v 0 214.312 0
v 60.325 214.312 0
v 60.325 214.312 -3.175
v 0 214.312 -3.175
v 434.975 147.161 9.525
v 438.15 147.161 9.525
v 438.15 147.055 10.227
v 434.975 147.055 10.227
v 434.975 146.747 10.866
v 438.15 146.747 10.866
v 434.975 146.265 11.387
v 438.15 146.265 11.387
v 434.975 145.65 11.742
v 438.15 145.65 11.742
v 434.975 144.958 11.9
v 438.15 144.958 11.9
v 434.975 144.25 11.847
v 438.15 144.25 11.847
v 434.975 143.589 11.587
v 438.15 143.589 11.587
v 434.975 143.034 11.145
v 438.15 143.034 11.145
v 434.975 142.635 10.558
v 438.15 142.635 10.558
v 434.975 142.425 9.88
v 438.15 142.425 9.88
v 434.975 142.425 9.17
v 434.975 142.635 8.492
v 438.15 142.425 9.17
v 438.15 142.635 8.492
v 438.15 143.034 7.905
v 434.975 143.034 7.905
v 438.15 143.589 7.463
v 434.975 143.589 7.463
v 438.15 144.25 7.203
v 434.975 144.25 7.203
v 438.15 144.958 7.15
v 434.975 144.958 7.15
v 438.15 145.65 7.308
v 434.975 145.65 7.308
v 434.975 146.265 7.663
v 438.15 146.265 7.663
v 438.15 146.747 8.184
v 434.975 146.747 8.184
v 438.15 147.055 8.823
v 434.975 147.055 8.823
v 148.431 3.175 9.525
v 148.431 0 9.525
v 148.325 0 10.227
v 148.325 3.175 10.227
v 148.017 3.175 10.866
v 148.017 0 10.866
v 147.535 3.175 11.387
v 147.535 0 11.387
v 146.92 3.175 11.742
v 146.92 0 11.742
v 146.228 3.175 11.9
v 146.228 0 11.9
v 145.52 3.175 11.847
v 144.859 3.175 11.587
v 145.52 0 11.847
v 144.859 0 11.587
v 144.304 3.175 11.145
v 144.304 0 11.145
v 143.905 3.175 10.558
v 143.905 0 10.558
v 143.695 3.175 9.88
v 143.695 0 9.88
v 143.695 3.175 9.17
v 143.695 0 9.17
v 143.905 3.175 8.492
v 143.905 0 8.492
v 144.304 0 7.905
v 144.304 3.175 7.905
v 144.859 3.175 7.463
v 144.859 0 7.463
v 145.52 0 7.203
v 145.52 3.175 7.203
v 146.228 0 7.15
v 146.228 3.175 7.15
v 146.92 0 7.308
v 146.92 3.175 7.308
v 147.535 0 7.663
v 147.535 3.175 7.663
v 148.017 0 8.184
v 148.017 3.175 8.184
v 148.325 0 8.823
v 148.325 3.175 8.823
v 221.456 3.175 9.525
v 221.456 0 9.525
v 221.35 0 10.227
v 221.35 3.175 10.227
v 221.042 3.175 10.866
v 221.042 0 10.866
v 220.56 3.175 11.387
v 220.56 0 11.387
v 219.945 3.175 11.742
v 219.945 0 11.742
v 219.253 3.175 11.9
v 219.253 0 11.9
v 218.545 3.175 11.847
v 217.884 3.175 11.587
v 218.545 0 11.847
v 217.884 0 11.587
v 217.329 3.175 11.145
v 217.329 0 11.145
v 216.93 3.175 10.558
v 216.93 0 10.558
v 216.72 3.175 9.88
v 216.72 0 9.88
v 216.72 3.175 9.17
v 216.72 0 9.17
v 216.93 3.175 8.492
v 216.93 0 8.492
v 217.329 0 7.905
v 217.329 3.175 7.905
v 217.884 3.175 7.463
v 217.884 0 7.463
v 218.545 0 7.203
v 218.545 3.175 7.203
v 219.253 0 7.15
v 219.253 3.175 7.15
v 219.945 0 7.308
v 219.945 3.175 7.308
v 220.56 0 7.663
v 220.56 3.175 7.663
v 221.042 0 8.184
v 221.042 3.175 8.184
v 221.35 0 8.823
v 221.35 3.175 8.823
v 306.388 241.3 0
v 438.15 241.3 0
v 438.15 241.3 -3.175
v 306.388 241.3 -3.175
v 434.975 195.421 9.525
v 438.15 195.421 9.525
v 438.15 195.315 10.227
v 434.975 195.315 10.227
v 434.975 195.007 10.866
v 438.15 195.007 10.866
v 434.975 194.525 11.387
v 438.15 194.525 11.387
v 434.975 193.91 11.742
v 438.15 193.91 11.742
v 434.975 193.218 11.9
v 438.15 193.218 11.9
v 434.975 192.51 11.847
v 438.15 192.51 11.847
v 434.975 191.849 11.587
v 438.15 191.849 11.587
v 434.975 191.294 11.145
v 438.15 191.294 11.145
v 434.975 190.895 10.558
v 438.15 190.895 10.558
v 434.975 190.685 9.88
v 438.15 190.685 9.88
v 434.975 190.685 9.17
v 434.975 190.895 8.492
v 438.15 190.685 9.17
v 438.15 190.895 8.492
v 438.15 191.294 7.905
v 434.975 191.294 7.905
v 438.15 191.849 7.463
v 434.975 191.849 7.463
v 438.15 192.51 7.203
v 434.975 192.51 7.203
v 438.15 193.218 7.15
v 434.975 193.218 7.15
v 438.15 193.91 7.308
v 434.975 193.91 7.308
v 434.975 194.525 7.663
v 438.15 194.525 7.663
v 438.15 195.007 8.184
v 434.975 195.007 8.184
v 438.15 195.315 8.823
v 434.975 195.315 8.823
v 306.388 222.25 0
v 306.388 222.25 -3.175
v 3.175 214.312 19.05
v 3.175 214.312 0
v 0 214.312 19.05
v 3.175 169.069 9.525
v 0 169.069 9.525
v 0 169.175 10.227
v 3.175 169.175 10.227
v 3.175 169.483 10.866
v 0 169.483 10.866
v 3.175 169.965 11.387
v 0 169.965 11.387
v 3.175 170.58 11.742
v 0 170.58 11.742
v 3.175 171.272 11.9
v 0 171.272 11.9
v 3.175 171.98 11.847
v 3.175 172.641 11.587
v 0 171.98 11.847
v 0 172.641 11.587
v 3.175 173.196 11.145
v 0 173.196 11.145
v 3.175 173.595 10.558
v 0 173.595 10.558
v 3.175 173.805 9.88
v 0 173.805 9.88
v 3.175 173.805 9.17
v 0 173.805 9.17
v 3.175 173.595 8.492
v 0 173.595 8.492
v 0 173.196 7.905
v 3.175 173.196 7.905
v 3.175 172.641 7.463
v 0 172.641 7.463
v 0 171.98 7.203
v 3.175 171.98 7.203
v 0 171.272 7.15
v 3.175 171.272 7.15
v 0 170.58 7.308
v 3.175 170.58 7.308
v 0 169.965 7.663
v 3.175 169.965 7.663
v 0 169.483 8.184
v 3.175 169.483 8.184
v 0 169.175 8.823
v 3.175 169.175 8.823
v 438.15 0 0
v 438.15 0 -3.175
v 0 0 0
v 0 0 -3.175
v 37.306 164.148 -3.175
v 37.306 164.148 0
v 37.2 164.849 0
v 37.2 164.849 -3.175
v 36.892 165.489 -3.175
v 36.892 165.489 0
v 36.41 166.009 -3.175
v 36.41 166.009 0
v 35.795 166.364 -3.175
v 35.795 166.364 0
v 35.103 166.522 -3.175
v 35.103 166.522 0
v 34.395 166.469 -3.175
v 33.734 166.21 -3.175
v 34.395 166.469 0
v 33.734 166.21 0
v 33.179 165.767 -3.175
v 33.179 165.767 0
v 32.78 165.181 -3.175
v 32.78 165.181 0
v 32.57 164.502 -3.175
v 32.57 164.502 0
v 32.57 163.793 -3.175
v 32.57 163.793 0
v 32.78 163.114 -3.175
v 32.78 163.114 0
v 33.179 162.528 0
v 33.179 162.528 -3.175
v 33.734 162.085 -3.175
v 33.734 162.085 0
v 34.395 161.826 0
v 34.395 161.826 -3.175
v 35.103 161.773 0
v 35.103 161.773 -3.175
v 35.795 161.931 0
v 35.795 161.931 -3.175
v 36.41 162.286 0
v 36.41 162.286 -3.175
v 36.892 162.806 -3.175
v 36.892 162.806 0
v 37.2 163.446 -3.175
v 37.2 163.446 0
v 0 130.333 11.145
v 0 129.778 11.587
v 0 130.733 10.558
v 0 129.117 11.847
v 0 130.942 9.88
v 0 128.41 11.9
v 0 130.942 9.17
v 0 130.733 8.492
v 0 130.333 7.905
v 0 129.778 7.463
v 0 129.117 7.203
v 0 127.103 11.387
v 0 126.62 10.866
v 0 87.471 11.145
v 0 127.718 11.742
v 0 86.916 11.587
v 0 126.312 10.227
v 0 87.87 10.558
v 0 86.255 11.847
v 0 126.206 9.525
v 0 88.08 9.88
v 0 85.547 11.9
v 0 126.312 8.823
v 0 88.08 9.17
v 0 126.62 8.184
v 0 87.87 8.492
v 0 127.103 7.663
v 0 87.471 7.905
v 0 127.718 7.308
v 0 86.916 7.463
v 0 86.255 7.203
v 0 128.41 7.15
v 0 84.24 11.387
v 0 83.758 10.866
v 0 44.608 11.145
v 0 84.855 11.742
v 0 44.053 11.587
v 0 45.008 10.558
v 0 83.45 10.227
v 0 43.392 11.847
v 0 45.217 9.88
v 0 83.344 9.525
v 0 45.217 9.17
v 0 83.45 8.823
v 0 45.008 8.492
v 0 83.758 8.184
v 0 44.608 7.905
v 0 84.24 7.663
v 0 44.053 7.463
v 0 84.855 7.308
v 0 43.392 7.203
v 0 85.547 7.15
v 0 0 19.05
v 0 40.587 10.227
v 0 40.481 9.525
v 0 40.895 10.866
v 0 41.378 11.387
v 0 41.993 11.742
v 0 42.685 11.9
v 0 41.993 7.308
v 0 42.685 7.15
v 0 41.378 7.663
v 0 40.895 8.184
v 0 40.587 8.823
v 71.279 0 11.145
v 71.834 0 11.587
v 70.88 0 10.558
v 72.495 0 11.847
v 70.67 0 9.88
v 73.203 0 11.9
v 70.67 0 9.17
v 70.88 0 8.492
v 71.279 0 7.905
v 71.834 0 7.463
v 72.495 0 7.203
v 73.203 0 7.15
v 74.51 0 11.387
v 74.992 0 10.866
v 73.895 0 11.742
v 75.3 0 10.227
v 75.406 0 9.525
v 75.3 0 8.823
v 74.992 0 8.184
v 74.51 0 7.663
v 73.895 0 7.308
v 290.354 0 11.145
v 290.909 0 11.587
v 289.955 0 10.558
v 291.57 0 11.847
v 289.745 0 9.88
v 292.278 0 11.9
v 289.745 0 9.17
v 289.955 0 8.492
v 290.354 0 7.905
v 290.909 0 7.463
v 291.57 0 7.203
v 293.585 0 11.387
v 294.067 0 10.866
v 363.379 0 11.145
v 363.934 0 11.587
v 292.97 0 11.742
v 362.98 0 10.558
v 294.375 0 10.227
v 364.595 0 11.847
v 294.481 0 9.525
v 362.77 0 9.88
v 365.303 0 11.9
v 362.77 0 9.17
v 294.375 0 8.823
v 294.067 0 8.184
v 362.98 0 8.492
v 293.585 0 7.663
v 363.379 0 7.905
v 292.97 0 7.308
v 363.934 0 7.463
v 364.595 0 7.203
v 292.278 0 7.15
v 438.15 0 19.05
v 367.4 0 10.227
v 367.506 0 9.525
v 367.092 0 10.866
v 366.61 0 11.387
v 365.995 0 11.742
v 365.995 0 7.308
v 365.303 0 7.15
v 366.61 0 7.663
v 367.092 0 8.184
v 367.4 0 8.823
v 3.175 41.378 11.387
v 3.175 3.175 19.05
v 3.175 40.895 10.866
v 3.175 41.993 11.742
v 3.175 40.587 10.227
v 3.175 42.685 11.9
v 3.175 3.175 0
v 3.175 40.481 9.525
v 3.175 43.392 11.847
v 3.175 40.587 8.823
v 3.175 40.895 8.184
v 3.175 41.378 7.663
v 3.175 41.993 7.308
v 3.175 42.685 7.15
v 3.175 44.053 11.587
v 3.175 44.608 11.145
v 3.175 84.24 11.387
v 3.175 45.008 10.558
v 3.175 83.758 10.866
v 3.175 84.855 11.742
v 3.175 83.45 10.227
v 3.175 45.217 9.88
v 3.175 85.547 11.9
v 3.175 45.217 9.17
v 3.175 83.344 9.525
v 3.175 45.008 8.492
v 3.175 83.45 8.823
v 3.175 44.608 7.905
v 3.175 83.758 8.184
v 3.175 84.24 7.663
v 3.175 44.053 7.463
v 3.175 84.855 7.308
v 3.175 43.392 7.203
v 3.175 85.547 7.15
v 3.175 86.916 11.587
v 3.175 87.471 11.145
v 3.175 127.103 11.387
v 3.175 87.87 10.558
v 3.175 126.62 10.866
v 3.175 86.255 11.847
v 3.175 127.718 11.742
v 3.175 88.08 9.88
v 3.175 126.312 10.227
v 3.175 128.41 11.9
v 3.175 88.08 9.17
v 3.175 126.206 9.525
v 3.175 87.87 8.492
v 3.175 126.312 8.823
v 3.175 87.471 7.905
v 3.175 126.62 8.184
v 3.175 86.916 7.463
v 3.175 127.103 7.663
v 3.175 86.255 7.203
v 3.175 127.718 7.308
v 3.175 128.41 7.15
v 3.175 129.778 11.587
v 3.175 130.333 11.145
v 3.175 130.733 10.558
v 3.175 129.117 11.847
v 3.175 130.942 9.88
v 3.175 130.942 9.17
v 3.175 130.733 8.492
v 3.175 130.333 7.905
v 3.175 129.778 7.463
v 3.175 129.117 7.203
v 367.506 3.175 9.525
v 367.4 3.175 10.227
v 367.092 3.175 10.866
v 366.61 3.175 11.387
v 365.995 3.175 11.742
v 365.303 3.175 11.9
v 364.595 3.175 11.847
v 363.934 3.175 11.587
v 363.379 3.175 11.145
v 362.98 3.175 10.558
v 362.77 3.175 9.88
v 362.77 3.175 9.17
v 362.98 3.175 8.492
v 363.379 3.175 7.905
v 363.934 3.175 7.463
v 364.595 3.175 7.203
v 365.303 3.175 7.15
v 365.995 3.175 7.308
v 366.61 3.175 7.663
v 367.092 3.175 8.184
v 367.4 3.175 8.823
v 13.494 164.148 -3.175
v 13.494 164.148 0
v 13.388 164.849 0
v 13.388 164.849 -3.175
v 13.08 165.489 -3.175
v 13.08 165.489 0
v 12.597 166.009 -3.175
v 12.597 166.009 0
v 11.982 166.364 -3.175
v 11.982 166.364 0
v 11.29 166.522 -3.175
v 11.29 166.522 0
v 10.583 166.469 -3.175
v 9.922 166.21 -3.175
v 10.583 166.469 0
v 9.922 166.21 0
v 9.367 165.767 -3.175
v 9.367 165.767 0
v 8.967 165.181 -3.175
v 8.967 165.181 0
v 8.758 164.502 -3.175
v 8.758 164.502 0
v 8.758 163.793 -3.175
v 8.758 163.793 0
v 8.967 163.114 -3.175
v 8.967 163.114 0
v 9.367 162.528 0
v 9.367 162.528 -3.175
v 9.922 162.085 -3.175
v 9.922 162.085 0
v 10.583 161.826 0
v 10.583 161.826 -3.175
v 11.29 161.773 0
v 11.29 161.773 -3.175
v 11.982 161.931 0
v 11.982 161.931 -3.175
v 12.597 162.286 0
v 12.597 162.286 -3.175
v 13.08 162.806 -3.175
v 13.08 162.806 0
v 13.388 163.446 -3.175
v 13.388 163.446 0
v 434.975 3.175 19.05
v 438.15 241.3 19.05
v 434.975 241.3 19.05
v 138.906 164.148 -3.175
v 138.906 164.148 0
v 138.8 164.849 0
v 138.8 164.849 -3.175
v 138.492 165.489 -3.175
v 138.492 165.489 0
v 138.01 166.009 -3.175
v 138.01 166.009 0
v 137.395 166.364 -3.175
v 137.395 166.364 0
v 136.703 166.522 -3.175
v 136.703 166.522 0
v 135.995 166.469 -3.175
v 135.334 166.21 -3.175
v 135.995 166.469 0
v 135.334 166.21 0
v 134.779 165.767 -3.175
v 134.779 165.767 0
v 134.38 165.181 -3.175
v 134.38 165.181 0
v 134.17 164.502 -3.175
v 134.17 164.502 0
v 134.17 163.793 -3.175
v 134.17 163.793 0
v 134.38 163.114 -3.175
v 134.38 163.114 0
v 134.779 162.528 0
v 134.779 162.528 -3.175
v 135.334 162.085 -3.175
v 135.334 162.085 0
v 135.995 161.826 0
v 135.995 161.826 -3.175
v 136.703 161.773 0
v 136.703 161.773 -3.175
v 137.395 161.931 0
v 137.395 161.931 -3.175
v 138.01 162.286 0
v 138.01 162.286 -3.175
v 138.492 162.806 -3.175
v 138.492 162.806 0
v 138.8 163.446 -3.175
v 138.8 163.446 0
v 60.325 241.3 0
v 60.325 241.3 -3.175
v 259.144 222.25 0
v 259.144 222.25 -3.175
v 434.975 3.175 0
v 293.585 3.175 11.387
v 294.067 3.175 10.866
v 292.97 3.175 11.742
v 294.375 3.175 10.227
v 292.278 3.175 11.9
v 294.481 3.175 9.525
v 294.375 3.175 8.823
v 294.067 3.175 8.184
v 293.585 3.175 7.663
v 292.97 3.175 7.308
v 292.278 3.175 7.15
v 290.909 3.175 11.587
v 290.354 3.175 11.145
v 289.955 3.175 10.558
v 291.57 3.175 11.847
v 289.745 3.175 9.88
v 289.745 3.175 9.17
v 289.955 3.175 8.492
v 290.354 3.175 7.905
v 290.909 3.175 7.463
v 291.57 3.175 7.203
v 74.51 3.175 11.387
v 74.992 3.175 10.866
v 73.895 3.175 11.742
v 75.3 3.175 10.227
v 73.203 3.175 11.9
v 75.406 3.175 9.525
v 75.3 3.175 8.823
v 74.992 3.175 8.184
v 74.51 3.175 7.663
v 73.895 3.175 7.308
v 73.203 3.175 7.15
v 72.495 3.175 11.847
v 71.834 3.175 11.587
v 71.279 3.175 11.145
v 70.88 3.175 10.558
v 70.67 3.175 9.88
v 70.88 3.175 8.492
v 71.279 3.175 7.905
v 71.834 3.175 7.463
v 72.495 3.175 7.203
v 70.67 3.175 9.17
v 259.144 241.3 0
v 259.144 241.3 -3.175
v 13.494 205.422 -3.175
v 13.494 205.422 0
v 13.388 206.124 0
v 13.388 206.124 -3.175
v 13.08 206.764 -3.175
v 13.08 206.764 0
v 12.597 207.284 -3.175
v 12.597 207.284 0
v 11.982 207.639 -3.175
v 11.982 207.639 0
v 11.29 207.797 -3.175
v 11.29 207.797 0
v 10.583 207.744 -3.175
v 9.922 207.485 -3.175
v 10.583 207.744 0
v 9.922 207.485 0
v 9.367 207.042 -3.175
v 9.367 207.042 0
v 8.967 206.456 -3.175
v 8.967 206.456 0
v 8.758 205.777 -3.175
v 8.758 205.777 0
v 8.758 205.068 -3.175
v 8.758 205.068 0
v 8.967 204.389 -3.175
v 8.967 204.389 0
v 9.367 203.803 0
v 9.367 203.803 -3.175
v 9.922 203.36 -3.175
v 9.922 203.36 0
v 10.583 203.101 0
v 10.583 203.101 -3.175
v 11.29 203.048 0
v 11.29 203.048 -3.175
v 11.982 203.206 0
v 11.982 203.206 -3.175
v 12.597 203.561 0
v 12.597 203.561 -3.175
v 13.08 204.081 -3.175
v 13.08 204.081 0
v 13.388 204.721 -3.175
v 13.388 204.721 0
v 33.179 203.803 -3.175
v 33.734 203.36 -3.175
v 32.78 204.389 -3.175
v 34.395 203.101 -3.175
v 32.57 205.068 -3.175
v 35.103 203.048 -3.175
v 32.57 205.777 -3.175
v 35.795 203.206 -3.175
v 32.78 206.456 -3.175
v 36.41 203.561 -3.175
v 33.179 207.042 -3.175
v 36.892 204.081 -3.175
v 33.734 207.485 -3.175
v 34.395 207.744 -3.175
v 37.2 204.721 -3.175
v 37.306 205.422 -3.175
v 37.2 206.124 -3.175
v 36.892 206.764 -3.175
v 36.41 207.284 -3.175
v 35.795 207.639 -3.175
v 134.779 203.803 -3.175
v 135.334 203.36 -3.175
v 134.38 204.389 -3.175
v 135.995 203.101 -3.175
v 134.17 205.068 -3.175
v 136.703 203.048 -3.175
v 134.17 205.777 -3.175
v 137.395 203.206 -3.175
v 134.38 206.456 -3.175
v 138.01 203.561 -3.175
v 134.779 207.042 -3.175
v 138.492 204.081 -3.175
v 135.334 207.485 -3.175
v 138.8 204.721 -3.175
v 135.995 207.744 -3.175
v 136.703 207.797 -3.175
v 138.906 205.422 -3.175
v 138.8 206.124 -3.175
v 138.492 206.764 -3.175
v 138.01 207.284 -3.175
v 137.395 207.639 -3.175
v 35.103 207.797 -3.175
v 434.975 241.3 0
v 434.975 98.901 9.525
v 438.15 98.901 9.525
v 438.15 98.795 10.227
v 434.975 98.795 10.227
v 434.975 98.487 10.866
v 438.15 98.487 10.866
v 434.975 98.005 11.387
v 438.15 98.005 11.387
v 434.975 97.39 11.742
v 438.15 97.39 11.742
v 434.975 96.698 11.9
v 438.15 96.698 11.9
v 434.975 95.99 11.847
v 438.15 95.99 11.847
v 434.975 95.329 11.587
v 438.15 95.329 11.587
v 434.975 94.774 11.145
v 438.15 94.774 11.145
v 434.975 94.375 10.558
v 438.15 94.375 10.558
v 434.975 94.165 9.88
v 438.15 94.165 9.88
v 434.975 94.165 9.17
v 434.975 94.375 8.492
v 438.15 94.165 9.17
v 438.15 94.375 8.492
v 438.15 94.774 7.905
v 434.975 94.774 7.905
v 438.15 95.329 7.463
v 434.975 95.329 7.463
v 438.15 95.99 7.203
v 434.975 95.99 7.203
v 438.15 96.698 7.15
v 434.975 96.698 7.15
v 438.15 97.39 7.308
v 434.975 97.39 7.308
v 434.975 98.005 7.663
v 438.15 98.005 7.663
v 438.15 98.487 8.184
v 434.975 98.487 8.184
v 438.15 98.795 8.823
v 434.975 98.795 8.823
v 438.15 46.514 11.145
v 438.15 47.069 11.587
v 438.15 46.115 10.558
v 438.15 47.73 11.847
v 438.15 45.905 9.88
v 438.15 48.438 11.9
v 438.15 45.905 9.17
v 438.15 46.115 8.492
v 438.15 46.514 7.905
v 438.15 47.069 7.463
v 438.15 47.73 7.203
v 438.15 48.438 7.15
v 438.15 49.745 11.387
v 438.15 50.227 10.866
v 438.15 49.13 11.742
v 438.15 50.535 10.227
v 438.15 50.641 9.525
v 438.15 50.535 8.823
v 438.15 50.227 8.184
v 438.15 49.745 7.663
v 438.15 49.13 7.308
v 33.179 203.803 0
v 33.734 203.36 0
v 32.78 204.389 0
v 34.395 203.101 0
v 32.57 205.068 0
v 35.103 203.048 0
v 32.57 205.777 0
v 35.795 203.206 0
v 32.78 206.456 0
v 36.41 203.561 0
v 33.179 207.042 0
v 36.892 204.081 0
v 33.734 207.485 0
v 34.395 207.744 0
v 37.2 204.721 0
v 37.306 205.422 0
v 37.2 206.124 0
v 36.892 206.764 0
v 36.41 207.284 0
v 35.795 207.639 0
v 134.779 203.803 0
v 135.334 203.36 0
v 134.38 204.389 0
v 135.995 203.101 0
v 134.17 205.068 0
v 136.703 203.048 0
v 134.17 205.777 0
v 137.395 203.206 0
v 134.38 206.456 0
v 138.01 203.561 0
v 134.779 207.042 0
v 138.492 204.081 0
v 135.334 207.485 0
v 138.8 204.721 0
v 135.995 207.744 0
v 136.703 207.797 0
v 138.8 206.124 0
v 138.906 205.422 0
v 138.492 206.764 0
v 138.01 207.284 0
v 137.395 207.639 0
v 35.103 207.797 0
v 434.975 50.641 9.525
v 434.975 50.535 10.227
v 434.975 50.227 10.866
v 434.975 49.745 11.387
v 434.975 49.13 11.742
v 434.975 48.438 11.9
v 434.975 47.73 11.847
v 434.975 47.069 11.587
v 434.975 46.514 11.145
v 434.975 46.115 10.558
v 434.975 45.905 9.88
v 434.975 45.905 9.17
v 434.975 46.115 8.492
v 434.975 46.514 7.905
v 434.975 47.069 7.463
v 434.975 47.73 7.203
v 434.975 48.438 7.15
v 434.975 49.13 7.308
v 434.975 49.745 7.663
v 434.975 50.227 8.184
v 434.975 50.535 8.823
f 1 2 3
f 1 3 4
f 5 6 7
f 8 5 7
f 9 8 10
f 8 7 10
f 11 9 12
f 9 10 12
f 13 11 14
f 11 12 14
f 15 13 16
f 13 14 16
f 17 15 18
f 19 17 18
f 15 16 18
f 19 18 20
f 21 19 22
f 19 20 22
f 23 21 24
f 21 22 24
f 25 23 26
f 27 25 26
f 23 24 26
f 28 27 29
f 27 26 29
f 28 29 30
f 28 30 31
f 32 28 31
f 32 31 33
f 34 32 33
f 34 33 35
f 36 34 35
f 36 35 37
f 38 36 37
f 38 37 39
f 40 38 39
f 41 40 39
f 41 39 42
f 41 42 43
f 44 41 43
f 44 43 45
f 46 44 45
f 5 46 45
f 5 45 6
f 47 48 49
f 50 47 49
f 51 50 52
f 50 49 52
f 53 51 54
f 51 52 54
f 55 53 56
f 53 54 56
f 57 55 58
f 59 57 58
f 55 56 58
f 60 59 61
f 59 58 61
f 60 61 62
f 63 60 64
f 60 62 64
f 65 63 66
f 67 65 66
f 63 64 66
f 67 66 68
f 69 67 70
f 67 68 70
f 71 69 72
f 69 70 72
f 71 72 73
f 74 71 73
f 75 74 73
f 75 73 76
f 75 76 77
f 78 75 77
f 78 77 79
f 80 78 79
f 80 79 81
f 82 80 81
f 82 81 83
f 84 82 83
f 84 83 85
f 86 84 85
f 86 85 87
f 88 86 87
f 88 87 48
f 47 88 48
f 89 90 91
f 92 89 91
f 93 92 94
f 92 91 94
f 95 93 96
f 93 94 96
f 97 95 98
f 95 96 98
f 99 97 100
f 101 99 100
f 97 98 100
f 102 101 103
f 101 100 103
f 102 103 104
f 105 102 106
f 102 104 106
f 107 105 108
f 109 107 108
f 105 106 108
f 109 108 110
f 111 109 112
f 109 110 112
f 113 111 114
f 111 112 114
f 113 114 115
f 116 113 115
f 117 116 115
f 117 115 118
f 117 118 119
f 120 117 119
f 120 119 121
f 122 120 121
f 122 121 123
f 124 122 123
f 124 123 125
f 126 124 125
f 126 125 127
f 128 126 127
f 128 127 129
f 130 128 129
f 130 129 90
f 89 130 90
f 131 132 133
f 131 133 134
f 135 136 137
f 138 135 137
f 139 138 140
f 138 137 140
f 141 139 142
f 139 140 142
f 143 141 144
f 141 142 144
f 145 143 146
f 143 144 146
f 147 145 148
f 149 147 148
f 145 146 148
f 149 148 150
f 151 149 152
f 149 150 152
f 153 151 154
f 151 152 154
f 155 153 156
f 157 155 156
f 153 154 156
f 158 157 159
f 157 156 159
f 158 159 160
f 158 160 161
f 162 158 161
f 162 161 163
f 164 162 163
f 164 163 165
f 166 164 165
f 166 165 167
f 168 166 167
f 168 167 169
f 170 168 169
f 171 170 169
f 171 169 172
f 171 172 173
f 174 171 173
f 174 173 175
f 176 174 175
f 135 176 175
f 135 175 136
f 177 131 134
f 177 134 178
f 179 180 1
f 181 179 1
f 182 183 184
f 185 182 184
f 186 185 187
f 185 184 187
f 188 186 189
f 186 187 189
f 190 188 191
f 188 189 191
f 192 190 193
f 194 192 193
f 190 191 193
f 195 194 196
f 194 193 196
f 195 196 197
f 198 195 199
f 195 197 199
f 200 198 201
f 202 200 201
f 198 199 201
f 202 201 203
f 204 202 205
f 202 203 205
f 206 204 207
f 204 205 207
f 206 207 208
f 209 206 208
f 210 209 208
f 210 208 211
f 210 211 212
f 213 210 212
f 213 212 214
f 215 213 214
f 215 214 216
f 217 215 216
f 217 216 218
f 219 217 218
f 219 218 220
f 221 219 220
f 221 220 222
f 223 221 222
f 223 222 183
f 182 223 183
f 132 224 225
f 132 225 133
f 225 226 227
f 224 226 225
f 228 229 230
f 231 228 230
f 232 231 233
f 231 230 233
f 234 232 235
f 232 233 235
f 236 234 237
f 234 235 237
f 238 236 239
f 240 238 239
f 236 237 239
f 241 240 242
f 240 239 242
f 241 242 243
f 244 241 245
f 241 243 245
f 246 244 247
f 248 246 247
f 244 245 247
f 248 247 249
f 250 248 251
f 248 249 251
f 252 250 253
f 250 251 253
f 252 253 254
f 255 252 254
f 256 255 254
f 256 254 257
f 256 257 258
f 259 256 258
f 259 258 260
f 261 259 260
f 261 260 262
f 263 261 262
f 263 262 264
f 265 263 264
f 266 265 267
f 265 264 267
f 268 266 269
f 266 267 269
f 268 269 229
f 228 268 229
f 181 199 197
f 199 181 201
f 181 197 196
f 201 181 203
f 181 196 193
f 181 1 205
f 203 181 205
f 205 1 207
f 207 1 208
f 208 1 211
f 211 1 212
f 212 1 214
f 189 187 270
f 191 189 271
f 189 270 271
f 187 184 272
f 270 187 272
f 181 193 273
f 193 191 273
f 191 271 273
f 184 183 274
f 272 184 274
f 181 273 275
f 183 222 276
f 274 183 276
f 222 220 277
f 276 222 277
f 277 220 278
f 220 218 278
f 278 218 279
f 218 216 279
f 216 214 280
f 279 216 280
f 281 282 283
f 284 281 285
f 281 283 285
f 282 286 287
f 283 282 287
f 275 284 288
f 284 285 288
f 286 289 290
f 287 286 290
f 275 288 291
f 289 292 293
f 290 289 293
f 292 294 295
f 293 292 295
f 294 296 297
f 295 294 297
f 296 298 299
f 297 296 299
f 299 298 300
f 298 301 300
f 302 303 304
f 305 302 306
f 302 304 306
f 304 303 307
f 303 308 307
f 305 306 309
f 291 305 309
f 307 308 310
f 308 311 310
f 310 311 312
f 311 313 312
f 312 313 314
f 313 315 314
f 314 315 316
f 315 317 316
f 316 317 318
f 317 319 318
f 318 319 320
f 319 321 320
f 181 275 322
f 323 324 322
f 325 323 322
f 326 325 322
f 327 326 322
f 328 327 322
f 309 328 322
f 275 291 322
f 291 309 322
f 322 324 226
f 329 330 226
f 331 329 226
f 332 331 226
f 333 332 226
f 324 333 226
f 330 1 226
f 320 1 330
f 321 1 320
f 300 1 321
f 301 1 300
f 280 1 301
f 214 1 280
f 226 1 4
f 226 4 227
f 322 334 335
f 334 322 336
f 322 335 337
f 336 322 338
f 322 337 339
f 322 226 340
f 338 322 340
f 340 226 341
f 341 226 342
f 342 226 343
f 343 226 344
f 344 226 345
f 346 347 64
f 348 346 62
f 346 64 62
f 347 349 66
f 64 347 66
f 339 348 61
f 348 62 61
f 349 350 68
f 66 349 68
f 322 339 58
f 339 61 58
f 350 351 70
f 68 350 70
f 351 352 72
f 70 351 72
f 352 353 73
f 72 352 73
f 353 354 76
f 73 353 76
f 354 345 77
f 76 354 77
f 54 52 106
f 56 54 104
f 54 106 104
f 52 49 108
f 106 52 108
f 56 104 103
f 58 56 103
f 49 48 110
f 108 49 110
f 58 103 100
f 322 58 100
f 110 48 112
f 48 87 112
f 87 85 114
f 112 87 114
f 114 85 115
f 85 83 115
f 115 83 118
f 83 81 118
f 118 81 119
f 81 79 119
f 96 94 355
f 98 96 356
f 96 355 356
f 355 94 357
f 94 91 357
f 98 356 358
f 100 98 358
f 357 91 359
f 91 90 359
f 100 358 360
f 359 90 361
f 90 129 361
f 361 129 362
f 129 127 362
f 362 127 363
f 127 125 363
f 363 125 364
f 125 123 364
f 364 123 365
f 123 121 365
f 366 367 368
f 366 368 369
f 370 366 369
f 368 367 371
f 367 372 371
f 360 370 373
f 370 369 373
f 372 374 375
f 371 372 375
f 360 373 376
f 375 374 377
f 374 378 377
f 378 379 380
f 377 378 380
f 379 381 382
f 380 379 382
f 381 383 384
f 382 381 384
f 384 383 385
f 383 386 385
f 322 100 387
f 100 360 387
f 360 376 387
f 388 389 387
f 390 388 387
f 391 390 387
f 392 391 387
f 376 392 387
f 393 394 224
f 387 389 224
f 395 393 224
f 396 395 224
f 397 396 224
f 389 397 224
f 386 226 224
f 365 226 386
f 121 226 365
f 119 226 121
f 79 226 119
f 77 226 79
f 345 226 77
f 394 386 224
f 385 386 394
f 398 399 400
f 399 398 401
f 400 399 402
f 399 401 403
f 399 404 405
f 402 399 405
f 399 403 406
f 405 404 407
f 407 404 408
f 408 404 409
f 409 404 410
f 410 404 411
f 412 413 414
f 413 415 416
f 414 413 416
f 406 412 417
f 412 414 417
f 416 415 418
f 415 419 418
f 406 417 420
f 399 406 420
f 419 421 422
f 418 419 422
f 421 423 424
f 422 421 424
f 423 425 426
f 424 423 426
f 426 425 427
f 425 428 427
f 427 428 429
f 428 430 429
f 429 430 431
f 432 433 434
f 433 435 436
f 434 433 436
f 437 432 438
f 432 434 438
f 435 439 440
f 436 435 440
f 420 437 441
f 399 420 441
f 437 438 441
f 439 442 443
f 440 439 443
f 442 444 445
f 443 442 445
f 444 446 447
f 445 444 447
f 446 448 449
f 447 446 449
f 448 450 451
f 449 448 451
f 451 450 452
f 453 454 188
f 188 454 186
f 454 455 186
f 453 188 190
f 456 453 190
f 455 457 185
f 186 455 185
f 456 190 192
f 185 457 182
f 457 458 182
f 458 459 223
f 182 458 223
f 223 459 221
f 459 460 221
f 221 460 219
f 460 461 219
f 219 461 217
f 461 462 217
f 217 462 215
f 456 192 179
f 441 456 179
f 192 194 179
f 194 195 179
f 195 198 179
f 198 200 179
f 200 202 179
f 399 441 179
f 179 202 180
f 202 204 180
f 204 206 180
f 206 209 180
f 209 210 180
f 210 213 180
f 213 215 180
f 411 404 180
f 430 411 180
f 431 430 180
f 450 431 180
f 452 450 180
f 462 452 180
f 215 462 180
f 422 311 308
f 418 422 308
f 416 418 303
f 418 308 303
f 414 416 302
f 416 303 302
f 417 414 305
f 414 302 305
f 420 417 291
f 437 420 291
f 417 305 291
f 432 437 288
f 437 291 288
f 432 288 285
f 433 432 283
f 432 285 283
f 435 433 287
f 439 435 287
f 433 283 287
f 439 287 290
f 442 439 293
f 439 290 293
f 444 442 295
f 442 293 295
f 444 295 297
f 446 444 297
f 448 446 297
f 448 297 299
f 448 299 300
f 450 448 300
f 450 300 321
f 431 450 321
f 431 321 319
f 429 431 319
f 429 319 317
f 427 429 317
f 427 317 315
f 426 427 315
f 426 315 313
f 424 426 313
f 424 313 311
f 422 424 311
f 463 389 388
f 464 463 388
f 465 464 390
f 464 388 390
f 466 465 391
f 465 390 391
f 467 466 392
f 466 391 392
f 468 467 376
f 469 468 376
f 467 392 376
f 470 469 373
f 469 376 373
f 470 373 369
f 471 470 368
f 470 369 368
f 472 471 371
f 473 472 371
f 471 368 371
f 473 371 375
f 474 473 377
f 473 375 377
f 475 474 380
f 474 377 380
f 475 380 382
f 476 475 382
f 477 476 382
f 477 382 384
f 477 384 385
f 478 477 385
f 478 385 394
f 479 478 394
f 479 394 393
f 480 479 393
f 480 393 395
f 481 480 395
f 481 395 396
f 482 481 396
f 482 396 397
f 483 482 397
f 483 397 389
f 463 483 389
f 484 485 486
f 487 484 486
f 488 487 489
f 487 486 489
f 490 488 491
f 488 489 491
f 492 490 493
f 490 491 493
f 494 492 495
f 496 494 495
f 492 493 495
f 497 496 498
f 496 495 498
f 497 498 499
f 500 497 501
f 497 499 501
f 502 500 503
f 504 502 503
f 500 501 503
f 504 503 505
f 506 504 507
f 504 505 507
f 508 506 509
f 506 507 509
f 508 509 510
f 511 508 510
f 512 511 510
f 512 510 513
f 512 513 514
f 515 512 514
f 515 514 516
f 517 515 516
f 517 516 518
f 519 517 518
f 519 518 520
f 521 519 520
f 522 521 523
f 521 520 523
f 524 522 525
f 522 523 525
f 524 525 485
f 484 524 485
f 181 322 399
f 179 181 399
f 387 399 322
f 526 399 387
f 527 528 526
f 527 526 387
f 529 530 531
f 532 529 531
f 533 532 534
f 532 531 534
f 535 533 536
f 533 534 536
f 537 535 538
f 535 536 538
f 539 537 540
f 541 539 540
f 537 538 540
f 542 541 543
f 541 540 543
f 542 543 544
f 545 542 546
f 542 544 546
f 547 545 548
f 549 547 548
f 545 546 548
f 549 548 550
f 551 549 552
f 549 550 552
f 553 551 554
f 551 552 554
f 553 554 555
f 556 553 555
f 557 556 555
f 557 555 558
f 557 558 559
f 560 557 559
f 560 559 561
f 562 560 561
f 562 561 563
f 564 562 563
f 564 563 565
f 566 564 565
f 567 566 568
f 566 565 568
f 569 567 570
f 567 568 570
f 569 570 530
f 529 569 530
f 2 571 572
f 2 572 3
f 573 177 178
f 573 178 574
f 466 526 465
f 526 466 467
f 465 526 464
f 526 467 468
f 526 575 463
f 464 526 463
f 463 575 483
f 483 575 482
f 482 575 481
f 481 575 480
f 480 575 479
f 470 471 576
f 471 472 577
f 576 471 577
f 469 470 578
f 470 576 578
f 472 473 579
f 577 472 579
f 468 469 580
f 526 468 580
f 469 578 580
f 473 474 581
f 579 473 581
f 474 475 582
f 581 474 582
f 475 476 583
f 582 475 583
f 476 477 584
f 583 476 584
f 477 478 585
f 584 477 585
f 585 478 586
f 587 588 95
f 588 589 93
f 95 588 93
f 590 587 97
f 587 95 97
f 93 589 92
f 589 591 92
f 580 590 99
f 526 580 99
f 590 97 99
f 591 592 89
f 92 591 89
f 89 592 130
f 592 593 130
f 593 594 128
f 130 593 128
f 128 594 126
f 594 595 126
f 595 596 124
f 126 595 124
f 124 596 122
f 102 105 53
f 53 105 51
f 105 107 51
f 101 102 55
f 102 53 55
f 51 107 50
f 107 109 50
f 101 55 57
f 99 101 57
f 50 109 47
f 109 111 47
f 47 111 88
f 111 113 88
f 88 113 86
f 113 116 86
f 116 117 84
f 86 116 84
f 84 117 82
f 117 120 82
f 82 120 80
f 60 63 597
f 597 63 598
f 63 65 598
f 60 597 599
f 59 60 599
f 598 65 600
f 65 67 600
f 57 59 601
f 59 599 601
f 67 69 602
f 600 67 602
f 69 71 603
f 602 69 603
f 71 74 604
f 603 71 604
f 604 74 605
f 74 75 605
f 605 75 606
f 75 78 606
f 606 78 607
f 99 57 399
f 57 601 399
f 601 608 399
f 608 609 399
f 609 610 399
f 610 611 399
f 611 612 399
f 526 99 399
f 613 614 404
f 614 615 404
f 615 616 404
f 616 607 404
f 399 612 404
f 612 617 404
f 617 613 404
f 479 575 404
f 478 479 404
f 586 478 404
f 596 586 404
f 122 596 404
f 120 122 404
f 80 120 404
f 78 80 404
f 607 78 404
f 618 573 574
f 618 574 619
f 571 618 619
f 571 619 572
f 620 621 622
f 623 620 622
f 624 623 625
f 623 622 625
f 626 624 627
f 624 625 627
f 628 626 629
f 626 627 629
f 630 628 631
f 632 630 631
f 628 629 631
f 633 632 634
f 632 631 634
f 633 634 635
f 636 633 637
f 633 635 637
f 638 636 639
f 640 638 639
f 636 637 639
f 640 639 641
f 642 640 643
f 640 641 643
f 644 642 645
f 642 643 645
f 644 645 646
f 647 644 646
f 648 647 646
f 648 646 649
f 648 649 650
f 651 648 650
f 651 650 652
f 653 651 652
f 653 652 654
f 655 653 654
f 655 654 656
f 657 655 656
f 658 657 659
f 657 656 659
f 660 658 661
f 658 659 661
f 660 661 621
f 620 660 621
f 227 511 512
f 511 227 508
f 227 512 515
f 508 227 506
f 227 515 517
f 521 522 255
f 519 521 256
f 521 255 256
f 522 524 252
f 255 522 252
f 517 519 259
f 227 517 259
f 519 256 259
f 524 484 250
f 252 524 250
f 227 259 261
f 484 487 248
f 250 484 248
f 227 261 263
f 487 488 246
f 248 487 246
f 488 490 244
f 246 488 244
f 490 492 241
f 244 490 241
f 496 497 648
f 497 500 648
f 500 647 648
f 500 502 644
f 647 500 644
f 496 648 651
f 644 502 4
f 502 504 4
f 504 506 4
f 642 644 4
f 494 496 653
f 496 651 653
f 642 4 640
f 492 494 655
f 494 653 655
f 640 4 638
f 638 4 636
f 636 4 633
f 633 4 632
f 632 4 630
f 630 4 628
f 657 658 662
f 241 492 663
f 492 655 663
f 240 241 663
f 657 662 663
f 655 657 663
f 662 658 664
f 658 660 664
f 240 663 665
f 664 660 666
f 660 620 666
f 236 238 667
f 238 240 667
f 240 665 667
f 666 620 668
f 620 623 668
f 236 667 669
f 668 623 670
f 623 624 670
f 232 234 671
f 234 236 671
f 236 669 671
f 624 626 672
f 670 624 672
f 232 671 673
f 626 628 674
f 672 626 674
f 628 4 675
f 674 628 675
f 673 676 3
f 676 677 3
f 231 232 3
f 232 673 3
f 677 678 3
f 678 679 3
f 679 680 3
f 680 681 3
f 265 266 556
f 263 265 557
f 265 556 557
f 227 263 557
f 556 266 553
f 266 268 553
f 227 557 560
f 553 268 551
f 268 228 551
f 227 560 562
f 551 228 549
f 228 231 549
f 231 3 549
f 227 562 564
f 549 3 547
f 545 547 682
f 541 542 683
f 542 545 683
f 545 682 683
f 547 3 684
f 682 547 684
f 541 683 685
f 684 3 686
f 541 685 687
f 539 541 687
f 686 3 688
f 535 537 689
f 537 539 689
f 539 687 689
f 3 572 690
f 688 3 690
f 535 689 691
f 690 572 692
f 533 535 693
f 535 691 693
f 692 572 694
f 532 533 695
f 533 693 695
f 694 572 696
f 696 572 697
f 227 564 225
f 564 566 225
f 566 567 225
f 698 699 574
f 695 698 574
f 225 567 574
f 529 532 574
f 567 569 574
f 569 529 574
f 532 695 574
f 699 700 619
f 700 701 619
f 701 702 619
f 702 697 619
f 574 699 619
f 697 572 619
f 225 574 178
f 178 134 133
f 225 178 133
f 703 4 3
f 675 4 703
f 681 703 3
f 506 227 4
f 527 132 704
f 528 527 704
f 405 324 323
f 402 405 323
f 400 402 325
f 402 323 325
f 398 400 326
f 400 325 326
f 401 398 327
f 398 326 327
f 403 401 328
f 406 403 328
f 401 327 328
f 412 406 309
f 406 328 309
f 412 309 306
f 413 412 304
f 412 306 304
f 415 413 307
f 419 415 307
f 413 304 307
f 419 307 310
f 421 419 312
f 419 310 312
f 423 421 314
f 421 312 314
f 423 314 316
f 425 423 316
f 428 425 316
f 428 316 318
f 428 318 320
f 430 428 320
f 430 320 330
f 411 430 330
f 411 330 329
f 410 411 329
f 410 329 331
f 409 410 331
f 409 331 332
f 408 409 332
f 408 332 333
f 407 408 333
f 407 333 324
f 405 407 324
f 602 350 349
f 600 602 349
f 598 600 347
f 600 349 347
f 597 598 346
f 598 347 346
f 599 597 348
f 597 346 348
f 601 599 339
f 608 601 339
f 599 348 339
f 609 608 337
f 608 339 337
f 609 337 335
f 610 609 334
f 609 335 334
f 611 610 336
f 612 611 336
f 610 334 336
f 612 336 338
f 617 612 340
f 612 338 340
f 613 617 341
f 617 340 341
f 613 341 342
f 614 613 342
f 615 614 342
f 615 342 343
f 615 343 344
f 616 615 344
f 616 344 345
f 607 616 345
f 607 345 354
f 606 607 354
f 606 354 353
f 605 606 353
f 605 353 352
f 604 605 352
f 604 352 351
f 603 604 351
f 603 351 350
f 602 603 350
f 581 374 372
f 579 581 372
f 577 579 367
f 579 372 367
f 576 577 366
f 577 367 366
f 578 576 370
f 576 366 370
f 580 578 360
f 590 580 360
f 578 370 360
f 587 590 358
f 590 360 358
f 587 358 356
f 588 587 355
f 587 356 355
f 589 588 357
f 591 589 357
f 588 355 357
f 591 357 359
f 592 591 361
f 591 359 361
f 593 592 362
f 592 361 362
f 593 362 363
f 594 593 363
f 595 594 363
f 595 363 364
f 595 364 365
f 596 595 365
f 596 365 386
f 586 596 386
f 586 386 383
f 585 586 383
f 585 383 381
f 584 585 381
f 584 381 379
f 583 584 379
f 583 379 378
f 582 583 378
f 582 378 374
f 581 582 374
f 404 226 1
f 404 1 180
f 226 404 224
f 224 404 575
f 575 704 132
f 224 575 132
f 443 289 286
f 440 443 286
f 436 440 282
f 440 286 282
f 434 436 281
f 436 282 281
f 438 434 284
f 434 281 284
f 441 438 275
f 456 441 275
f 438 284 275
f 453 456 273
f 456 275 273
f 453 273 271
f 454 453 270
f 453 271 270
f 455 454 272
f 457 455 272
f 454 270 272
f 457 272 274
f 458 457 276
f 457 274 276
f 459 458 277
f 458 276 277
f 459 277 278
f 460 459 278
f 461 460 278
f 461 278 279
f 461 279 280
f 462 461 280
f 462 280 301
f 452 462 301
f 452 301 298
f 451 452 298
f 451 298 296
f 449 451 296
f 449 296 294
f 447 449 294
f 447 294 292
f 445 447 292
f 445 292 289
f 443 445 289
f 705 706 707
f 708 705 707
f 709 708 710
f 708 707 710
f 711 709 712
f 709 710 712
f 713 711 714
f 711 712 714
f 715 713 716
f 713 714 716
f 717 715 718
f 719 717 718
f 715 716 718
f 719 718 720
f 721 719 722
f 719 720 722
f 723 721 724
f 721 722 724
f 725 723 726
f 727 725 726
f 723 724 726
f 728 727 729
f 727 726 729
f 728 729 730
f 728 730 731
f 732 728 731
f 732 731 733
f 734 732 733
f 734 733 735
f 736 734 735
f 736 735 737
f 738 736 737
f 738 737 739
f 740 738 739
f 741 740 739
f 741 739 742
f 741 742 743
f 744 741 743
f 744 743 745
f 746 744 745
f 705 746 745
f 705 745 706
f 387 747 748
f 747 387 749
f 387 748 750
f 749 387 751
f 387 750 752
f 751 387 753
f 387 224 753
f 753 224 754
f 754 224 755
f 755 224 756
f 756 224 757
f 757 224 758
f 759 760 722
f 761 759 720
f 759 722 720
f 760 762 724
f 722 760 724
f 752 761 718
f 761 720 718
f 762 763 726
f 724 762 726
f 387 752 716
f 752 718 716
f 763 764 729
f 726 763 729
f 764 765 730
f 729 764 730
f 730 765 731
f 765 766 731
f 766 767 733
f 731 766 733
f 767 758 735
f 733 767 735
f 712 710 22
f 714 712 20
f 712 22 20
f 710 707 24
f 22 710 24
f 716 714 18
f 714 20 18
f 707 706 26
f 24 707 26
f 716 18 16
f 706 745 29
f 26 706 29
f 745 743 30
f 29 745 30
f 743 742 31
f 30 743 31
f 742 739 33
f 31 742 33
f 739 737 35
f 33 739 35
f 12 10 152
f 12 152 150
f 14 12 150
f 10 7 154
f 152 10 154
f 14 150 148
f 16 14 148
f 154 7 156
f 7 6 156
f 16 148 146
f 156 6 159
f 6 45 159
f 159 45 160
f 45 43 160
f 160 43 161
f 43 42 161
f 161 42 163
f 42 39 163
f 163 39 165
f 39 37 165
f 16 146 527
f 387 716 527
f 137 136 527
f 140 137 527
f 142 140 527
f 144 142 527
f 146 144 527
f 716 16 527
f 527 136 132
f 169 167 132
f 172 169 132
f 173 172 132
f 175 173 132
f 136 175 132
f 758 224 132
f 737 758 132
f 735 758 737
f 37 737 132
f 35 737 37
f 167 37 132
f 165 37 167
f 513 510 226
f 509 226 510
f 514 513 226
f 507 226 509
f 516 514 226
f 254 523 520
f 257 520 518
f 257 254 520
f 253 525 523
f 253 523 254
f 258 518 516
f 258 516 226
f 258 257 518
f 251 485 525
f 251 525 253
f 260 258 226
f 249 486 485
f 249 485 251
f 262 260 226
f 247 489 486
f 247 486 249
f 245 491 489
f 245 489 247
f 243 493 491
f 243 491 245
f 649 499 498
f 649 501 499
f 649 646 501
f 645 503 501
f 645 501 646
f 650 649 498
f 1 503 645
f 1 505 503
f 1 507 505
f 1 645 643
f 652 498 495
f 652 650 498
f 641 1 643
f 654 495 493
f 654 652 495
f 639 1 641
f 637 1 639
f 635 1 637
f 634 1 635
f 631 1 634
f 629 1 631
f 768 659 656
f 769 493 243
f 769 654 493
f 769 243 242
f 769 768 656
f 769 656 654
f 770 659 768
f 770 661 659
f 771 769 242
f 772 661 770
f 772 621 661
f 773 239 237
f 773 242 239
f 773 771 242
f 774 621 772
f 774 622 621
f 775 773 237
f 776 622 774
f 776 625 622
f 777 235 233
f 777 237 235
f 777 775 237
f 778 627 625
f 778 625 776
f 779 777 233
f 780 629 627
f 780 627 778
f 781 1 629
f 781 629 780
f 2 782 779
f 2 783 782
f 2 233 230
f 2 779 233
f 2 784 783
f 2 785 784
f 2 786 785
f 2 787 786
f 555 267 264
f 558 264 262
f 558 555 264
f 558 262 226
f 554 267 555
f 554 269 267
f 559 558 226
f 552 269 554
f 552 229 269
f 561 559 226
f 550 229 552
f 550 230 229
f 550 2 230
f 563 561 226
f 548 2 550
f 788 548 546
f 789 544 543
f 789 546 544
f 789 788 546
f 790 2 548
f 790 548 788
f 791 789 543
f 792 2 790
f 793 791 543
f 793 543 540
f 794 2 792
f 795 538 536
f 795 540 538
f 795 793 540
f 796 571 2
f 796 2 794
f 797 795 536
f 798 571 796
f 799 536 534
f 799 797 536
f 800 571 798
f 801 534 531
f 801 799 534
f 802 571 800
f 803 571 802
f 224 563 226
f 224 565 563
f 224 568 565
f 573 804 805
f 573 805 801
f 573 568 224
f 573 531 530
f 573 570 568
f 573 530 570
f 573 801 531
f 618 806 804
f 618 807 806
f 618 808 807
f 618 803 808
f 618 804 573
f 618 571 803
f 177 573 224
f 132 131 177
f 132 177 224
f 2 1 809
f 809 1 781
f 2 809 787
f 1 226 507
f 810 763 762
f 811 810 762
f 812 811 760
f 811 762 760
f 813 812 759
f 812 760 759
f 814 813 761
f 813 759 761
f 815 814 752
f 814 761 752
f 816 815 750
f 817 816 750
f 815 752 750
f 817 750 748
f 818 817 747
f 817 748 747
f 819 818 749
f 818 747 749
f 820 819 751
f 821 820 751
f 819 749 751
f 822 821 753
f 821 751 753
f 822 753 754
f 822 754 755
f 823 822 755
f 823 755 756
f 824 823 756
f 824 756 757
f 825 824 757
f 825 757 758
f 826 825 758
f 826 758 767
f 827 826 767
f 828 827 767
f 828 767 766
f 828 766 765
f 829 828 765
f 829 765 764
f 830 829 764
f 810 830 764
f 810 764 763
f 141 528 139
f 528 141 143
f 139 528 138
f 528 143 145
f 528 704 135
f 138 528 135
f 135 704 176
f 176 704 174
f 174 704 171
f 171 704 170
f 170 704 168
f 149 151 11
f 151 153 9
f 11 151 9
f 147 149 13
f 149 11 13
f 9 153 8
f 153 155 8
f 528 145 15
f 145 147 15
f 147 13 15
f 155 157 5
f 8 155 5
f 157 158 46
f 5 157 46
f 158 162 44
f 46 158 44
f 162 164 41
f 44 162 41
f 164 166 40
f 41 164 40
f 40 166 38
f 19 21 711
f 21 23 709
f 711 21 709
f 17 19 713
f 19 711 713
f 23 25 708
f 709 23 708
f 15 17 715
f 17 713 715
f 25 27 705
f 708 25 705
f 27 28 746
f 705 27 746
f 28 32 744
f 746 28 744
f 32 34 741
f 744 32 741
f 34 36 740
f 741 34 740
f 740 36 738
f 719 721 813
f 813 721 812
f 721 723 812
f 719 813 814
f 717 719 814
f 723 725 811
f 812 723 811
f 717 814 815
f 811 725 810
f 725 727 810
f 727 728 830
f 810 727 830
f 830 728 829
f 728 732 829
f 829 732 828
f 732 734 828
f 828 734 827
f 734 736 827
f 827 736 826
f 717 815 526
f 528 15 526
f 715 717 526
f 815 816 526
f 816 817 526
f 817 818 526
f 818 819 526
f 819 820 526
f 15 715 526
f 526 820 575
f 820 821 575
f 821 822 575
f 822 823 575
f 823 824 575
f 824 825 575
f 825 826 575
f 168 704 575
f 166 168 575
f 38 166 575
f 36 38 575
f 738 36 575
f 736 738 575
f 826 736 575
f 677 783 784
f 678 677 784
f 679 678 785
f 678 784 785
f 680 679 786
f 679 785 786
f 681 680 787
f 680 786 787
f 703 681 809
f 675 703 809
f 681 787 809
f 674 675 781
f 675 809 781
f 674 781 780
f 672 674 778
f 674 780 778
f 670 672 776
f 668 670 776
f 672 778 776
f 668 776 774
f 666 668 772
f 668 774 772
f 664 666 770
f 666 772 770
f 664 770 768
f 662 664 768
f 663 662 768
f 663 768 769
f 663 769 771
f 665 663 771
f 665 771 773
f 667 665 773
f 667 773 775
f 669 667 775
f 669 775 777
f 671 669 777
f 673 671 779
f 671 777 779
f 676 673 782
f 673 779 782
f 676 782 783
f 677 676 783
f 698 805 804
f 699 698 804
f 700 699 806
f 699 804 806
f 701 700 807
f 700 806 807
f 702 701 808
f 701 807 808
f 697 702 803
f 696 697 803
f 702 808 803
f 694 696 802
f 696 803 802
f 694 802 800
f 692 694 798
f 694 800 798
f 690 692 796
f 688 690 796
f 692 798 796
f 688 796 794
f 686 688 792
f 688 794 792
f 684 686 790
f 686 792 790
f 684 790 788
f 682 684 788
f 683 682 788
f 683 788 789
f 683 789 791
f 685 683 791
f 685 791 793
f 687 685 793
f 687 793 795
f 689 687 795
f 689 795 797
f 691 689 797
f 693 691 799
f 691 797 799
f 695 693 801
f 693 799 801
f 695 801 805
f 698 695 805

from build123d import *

# Parameters (mm, degrees)
F1_DEPTH = 19.05
F0_R     = 2.38125
F2_DEPTH = 3.175
F3_R     = 2.38125
F4_DEPTH = 12.7
F5_R     = 2.38125
F6_DEPTH = 12.7
F7_R     = 2.38125
F8_DEPTH = 12.7


with BuildPart() as f1:
    # F0 (on Top) → F1 (new body)
    with BuildSketch(Plane.XY):
        Polygon((0, 214.3125), (0, 0), (438.15, 0), (438.15, 241.3), (434.975, 241.3), (434.975, 3.175), (3.175, 3.175), (3.175, 214.3125), align=None)
    extrude(amount=F1_DEPTH)

    # F3 (on face) → F4 (cut)
    with BuildSketch(Plane(origin=(0, 0, 0), x_dir=(0, -1, 0), z_dir=(-1, 0, 0))):
        with Locations((-171.45, 9.525)):
            Circle(F3_R)
        with Locations((-128.5875, 9.525)):
            Circle(F3_R)
        with Locations((-85.725, 9.525)):
            Circle(F3_R)
        with Locations((-42.8625, 9.525)):
            Circle(F3_R)
    extrude(amount=-F4_DEPTH, mode=Mode.SUBTRACT)

    # F5 (on face) → F6 (cut)
    with BuildSketch(Plane.XZ):
        with Locations((73.025, 9.525)):
            Circle(F5_R)
        with Locations((146.05, 9.525)):
            Circle(F5_R)
        with Locations((219.075, 9.525)):
            Circle(F5_R)
        with Locations((292.1, 9.525)):
            Circle(F5_R)
        with Locations((365.125, 9.525)):
            Circle(F5_R)
    extrude(amount=-F6_DEPTH, mode=Mode.SUBTRACT)

    # F7 (on face) → F8 (cut)
    with BuildSketch(Plane.YZ.offset(438.15)):
        with Locations((48.26, 9.525)):
            Circle(F7_R)
        with Locations((96.52, 9.525)):
            Circle(F7_R)
        with Locations((144.78, 9.525)):
            Circle(F7_R)
        with Locations((193.04, 9.525)):
            Circle(F7_R)
    extrude(amount=-F8_DEPTH, mode=Mode.SUBTRACT)


with BuildPart() as f2:
    # F0 (on Top) → F2 (new body)
    with BuildSketch(Plane.XY):
        Polygon((60.325, 214.3125), (3.175, 214.3125), (3.175, 3.175), (434.975, 3.175), (434.975, 241.3), (306.3875, 241.3), (306.3875, 222.25), (259.1435, 222.25), (259.1435, 241.3), (60.325, 241.3), align=None)
        with Locations((11.1125, 164.1475)):
            Circle(F0_R, mode=Mode.SUBTRACT)
        with Locations((34.925, 164.1475)):
            Circle(F0_R, mode=Mode.SUBTRACT)
        with Locations((136.525, 164.1475)):
            Circle(F0_R, mode=Mode.SUBTRACT)
        with Locations((11.1125, 205.4225)):
            Circle(F0_R, mode=Mode.SUBTRACT)
        with Locations((34.925, 205.4225)):
            Circle(F0_R, mode=Mode.SUBTRACT)
        with Locations((136.525, 205.4225)):
            Circle(F0_R, mode=Mode.SUBTRACT)
        Polygon((0, 214.3125), (0, 0), (438.15, 0), (438.15, 241.3), (434.975, 241.3), (434.975, 3.175), (3.175, 3.175), (3.175, 214.3125), align=None)
    extrude(amount=-F2_DEPTH)


solid = Compound([f1.part, f2.part])
